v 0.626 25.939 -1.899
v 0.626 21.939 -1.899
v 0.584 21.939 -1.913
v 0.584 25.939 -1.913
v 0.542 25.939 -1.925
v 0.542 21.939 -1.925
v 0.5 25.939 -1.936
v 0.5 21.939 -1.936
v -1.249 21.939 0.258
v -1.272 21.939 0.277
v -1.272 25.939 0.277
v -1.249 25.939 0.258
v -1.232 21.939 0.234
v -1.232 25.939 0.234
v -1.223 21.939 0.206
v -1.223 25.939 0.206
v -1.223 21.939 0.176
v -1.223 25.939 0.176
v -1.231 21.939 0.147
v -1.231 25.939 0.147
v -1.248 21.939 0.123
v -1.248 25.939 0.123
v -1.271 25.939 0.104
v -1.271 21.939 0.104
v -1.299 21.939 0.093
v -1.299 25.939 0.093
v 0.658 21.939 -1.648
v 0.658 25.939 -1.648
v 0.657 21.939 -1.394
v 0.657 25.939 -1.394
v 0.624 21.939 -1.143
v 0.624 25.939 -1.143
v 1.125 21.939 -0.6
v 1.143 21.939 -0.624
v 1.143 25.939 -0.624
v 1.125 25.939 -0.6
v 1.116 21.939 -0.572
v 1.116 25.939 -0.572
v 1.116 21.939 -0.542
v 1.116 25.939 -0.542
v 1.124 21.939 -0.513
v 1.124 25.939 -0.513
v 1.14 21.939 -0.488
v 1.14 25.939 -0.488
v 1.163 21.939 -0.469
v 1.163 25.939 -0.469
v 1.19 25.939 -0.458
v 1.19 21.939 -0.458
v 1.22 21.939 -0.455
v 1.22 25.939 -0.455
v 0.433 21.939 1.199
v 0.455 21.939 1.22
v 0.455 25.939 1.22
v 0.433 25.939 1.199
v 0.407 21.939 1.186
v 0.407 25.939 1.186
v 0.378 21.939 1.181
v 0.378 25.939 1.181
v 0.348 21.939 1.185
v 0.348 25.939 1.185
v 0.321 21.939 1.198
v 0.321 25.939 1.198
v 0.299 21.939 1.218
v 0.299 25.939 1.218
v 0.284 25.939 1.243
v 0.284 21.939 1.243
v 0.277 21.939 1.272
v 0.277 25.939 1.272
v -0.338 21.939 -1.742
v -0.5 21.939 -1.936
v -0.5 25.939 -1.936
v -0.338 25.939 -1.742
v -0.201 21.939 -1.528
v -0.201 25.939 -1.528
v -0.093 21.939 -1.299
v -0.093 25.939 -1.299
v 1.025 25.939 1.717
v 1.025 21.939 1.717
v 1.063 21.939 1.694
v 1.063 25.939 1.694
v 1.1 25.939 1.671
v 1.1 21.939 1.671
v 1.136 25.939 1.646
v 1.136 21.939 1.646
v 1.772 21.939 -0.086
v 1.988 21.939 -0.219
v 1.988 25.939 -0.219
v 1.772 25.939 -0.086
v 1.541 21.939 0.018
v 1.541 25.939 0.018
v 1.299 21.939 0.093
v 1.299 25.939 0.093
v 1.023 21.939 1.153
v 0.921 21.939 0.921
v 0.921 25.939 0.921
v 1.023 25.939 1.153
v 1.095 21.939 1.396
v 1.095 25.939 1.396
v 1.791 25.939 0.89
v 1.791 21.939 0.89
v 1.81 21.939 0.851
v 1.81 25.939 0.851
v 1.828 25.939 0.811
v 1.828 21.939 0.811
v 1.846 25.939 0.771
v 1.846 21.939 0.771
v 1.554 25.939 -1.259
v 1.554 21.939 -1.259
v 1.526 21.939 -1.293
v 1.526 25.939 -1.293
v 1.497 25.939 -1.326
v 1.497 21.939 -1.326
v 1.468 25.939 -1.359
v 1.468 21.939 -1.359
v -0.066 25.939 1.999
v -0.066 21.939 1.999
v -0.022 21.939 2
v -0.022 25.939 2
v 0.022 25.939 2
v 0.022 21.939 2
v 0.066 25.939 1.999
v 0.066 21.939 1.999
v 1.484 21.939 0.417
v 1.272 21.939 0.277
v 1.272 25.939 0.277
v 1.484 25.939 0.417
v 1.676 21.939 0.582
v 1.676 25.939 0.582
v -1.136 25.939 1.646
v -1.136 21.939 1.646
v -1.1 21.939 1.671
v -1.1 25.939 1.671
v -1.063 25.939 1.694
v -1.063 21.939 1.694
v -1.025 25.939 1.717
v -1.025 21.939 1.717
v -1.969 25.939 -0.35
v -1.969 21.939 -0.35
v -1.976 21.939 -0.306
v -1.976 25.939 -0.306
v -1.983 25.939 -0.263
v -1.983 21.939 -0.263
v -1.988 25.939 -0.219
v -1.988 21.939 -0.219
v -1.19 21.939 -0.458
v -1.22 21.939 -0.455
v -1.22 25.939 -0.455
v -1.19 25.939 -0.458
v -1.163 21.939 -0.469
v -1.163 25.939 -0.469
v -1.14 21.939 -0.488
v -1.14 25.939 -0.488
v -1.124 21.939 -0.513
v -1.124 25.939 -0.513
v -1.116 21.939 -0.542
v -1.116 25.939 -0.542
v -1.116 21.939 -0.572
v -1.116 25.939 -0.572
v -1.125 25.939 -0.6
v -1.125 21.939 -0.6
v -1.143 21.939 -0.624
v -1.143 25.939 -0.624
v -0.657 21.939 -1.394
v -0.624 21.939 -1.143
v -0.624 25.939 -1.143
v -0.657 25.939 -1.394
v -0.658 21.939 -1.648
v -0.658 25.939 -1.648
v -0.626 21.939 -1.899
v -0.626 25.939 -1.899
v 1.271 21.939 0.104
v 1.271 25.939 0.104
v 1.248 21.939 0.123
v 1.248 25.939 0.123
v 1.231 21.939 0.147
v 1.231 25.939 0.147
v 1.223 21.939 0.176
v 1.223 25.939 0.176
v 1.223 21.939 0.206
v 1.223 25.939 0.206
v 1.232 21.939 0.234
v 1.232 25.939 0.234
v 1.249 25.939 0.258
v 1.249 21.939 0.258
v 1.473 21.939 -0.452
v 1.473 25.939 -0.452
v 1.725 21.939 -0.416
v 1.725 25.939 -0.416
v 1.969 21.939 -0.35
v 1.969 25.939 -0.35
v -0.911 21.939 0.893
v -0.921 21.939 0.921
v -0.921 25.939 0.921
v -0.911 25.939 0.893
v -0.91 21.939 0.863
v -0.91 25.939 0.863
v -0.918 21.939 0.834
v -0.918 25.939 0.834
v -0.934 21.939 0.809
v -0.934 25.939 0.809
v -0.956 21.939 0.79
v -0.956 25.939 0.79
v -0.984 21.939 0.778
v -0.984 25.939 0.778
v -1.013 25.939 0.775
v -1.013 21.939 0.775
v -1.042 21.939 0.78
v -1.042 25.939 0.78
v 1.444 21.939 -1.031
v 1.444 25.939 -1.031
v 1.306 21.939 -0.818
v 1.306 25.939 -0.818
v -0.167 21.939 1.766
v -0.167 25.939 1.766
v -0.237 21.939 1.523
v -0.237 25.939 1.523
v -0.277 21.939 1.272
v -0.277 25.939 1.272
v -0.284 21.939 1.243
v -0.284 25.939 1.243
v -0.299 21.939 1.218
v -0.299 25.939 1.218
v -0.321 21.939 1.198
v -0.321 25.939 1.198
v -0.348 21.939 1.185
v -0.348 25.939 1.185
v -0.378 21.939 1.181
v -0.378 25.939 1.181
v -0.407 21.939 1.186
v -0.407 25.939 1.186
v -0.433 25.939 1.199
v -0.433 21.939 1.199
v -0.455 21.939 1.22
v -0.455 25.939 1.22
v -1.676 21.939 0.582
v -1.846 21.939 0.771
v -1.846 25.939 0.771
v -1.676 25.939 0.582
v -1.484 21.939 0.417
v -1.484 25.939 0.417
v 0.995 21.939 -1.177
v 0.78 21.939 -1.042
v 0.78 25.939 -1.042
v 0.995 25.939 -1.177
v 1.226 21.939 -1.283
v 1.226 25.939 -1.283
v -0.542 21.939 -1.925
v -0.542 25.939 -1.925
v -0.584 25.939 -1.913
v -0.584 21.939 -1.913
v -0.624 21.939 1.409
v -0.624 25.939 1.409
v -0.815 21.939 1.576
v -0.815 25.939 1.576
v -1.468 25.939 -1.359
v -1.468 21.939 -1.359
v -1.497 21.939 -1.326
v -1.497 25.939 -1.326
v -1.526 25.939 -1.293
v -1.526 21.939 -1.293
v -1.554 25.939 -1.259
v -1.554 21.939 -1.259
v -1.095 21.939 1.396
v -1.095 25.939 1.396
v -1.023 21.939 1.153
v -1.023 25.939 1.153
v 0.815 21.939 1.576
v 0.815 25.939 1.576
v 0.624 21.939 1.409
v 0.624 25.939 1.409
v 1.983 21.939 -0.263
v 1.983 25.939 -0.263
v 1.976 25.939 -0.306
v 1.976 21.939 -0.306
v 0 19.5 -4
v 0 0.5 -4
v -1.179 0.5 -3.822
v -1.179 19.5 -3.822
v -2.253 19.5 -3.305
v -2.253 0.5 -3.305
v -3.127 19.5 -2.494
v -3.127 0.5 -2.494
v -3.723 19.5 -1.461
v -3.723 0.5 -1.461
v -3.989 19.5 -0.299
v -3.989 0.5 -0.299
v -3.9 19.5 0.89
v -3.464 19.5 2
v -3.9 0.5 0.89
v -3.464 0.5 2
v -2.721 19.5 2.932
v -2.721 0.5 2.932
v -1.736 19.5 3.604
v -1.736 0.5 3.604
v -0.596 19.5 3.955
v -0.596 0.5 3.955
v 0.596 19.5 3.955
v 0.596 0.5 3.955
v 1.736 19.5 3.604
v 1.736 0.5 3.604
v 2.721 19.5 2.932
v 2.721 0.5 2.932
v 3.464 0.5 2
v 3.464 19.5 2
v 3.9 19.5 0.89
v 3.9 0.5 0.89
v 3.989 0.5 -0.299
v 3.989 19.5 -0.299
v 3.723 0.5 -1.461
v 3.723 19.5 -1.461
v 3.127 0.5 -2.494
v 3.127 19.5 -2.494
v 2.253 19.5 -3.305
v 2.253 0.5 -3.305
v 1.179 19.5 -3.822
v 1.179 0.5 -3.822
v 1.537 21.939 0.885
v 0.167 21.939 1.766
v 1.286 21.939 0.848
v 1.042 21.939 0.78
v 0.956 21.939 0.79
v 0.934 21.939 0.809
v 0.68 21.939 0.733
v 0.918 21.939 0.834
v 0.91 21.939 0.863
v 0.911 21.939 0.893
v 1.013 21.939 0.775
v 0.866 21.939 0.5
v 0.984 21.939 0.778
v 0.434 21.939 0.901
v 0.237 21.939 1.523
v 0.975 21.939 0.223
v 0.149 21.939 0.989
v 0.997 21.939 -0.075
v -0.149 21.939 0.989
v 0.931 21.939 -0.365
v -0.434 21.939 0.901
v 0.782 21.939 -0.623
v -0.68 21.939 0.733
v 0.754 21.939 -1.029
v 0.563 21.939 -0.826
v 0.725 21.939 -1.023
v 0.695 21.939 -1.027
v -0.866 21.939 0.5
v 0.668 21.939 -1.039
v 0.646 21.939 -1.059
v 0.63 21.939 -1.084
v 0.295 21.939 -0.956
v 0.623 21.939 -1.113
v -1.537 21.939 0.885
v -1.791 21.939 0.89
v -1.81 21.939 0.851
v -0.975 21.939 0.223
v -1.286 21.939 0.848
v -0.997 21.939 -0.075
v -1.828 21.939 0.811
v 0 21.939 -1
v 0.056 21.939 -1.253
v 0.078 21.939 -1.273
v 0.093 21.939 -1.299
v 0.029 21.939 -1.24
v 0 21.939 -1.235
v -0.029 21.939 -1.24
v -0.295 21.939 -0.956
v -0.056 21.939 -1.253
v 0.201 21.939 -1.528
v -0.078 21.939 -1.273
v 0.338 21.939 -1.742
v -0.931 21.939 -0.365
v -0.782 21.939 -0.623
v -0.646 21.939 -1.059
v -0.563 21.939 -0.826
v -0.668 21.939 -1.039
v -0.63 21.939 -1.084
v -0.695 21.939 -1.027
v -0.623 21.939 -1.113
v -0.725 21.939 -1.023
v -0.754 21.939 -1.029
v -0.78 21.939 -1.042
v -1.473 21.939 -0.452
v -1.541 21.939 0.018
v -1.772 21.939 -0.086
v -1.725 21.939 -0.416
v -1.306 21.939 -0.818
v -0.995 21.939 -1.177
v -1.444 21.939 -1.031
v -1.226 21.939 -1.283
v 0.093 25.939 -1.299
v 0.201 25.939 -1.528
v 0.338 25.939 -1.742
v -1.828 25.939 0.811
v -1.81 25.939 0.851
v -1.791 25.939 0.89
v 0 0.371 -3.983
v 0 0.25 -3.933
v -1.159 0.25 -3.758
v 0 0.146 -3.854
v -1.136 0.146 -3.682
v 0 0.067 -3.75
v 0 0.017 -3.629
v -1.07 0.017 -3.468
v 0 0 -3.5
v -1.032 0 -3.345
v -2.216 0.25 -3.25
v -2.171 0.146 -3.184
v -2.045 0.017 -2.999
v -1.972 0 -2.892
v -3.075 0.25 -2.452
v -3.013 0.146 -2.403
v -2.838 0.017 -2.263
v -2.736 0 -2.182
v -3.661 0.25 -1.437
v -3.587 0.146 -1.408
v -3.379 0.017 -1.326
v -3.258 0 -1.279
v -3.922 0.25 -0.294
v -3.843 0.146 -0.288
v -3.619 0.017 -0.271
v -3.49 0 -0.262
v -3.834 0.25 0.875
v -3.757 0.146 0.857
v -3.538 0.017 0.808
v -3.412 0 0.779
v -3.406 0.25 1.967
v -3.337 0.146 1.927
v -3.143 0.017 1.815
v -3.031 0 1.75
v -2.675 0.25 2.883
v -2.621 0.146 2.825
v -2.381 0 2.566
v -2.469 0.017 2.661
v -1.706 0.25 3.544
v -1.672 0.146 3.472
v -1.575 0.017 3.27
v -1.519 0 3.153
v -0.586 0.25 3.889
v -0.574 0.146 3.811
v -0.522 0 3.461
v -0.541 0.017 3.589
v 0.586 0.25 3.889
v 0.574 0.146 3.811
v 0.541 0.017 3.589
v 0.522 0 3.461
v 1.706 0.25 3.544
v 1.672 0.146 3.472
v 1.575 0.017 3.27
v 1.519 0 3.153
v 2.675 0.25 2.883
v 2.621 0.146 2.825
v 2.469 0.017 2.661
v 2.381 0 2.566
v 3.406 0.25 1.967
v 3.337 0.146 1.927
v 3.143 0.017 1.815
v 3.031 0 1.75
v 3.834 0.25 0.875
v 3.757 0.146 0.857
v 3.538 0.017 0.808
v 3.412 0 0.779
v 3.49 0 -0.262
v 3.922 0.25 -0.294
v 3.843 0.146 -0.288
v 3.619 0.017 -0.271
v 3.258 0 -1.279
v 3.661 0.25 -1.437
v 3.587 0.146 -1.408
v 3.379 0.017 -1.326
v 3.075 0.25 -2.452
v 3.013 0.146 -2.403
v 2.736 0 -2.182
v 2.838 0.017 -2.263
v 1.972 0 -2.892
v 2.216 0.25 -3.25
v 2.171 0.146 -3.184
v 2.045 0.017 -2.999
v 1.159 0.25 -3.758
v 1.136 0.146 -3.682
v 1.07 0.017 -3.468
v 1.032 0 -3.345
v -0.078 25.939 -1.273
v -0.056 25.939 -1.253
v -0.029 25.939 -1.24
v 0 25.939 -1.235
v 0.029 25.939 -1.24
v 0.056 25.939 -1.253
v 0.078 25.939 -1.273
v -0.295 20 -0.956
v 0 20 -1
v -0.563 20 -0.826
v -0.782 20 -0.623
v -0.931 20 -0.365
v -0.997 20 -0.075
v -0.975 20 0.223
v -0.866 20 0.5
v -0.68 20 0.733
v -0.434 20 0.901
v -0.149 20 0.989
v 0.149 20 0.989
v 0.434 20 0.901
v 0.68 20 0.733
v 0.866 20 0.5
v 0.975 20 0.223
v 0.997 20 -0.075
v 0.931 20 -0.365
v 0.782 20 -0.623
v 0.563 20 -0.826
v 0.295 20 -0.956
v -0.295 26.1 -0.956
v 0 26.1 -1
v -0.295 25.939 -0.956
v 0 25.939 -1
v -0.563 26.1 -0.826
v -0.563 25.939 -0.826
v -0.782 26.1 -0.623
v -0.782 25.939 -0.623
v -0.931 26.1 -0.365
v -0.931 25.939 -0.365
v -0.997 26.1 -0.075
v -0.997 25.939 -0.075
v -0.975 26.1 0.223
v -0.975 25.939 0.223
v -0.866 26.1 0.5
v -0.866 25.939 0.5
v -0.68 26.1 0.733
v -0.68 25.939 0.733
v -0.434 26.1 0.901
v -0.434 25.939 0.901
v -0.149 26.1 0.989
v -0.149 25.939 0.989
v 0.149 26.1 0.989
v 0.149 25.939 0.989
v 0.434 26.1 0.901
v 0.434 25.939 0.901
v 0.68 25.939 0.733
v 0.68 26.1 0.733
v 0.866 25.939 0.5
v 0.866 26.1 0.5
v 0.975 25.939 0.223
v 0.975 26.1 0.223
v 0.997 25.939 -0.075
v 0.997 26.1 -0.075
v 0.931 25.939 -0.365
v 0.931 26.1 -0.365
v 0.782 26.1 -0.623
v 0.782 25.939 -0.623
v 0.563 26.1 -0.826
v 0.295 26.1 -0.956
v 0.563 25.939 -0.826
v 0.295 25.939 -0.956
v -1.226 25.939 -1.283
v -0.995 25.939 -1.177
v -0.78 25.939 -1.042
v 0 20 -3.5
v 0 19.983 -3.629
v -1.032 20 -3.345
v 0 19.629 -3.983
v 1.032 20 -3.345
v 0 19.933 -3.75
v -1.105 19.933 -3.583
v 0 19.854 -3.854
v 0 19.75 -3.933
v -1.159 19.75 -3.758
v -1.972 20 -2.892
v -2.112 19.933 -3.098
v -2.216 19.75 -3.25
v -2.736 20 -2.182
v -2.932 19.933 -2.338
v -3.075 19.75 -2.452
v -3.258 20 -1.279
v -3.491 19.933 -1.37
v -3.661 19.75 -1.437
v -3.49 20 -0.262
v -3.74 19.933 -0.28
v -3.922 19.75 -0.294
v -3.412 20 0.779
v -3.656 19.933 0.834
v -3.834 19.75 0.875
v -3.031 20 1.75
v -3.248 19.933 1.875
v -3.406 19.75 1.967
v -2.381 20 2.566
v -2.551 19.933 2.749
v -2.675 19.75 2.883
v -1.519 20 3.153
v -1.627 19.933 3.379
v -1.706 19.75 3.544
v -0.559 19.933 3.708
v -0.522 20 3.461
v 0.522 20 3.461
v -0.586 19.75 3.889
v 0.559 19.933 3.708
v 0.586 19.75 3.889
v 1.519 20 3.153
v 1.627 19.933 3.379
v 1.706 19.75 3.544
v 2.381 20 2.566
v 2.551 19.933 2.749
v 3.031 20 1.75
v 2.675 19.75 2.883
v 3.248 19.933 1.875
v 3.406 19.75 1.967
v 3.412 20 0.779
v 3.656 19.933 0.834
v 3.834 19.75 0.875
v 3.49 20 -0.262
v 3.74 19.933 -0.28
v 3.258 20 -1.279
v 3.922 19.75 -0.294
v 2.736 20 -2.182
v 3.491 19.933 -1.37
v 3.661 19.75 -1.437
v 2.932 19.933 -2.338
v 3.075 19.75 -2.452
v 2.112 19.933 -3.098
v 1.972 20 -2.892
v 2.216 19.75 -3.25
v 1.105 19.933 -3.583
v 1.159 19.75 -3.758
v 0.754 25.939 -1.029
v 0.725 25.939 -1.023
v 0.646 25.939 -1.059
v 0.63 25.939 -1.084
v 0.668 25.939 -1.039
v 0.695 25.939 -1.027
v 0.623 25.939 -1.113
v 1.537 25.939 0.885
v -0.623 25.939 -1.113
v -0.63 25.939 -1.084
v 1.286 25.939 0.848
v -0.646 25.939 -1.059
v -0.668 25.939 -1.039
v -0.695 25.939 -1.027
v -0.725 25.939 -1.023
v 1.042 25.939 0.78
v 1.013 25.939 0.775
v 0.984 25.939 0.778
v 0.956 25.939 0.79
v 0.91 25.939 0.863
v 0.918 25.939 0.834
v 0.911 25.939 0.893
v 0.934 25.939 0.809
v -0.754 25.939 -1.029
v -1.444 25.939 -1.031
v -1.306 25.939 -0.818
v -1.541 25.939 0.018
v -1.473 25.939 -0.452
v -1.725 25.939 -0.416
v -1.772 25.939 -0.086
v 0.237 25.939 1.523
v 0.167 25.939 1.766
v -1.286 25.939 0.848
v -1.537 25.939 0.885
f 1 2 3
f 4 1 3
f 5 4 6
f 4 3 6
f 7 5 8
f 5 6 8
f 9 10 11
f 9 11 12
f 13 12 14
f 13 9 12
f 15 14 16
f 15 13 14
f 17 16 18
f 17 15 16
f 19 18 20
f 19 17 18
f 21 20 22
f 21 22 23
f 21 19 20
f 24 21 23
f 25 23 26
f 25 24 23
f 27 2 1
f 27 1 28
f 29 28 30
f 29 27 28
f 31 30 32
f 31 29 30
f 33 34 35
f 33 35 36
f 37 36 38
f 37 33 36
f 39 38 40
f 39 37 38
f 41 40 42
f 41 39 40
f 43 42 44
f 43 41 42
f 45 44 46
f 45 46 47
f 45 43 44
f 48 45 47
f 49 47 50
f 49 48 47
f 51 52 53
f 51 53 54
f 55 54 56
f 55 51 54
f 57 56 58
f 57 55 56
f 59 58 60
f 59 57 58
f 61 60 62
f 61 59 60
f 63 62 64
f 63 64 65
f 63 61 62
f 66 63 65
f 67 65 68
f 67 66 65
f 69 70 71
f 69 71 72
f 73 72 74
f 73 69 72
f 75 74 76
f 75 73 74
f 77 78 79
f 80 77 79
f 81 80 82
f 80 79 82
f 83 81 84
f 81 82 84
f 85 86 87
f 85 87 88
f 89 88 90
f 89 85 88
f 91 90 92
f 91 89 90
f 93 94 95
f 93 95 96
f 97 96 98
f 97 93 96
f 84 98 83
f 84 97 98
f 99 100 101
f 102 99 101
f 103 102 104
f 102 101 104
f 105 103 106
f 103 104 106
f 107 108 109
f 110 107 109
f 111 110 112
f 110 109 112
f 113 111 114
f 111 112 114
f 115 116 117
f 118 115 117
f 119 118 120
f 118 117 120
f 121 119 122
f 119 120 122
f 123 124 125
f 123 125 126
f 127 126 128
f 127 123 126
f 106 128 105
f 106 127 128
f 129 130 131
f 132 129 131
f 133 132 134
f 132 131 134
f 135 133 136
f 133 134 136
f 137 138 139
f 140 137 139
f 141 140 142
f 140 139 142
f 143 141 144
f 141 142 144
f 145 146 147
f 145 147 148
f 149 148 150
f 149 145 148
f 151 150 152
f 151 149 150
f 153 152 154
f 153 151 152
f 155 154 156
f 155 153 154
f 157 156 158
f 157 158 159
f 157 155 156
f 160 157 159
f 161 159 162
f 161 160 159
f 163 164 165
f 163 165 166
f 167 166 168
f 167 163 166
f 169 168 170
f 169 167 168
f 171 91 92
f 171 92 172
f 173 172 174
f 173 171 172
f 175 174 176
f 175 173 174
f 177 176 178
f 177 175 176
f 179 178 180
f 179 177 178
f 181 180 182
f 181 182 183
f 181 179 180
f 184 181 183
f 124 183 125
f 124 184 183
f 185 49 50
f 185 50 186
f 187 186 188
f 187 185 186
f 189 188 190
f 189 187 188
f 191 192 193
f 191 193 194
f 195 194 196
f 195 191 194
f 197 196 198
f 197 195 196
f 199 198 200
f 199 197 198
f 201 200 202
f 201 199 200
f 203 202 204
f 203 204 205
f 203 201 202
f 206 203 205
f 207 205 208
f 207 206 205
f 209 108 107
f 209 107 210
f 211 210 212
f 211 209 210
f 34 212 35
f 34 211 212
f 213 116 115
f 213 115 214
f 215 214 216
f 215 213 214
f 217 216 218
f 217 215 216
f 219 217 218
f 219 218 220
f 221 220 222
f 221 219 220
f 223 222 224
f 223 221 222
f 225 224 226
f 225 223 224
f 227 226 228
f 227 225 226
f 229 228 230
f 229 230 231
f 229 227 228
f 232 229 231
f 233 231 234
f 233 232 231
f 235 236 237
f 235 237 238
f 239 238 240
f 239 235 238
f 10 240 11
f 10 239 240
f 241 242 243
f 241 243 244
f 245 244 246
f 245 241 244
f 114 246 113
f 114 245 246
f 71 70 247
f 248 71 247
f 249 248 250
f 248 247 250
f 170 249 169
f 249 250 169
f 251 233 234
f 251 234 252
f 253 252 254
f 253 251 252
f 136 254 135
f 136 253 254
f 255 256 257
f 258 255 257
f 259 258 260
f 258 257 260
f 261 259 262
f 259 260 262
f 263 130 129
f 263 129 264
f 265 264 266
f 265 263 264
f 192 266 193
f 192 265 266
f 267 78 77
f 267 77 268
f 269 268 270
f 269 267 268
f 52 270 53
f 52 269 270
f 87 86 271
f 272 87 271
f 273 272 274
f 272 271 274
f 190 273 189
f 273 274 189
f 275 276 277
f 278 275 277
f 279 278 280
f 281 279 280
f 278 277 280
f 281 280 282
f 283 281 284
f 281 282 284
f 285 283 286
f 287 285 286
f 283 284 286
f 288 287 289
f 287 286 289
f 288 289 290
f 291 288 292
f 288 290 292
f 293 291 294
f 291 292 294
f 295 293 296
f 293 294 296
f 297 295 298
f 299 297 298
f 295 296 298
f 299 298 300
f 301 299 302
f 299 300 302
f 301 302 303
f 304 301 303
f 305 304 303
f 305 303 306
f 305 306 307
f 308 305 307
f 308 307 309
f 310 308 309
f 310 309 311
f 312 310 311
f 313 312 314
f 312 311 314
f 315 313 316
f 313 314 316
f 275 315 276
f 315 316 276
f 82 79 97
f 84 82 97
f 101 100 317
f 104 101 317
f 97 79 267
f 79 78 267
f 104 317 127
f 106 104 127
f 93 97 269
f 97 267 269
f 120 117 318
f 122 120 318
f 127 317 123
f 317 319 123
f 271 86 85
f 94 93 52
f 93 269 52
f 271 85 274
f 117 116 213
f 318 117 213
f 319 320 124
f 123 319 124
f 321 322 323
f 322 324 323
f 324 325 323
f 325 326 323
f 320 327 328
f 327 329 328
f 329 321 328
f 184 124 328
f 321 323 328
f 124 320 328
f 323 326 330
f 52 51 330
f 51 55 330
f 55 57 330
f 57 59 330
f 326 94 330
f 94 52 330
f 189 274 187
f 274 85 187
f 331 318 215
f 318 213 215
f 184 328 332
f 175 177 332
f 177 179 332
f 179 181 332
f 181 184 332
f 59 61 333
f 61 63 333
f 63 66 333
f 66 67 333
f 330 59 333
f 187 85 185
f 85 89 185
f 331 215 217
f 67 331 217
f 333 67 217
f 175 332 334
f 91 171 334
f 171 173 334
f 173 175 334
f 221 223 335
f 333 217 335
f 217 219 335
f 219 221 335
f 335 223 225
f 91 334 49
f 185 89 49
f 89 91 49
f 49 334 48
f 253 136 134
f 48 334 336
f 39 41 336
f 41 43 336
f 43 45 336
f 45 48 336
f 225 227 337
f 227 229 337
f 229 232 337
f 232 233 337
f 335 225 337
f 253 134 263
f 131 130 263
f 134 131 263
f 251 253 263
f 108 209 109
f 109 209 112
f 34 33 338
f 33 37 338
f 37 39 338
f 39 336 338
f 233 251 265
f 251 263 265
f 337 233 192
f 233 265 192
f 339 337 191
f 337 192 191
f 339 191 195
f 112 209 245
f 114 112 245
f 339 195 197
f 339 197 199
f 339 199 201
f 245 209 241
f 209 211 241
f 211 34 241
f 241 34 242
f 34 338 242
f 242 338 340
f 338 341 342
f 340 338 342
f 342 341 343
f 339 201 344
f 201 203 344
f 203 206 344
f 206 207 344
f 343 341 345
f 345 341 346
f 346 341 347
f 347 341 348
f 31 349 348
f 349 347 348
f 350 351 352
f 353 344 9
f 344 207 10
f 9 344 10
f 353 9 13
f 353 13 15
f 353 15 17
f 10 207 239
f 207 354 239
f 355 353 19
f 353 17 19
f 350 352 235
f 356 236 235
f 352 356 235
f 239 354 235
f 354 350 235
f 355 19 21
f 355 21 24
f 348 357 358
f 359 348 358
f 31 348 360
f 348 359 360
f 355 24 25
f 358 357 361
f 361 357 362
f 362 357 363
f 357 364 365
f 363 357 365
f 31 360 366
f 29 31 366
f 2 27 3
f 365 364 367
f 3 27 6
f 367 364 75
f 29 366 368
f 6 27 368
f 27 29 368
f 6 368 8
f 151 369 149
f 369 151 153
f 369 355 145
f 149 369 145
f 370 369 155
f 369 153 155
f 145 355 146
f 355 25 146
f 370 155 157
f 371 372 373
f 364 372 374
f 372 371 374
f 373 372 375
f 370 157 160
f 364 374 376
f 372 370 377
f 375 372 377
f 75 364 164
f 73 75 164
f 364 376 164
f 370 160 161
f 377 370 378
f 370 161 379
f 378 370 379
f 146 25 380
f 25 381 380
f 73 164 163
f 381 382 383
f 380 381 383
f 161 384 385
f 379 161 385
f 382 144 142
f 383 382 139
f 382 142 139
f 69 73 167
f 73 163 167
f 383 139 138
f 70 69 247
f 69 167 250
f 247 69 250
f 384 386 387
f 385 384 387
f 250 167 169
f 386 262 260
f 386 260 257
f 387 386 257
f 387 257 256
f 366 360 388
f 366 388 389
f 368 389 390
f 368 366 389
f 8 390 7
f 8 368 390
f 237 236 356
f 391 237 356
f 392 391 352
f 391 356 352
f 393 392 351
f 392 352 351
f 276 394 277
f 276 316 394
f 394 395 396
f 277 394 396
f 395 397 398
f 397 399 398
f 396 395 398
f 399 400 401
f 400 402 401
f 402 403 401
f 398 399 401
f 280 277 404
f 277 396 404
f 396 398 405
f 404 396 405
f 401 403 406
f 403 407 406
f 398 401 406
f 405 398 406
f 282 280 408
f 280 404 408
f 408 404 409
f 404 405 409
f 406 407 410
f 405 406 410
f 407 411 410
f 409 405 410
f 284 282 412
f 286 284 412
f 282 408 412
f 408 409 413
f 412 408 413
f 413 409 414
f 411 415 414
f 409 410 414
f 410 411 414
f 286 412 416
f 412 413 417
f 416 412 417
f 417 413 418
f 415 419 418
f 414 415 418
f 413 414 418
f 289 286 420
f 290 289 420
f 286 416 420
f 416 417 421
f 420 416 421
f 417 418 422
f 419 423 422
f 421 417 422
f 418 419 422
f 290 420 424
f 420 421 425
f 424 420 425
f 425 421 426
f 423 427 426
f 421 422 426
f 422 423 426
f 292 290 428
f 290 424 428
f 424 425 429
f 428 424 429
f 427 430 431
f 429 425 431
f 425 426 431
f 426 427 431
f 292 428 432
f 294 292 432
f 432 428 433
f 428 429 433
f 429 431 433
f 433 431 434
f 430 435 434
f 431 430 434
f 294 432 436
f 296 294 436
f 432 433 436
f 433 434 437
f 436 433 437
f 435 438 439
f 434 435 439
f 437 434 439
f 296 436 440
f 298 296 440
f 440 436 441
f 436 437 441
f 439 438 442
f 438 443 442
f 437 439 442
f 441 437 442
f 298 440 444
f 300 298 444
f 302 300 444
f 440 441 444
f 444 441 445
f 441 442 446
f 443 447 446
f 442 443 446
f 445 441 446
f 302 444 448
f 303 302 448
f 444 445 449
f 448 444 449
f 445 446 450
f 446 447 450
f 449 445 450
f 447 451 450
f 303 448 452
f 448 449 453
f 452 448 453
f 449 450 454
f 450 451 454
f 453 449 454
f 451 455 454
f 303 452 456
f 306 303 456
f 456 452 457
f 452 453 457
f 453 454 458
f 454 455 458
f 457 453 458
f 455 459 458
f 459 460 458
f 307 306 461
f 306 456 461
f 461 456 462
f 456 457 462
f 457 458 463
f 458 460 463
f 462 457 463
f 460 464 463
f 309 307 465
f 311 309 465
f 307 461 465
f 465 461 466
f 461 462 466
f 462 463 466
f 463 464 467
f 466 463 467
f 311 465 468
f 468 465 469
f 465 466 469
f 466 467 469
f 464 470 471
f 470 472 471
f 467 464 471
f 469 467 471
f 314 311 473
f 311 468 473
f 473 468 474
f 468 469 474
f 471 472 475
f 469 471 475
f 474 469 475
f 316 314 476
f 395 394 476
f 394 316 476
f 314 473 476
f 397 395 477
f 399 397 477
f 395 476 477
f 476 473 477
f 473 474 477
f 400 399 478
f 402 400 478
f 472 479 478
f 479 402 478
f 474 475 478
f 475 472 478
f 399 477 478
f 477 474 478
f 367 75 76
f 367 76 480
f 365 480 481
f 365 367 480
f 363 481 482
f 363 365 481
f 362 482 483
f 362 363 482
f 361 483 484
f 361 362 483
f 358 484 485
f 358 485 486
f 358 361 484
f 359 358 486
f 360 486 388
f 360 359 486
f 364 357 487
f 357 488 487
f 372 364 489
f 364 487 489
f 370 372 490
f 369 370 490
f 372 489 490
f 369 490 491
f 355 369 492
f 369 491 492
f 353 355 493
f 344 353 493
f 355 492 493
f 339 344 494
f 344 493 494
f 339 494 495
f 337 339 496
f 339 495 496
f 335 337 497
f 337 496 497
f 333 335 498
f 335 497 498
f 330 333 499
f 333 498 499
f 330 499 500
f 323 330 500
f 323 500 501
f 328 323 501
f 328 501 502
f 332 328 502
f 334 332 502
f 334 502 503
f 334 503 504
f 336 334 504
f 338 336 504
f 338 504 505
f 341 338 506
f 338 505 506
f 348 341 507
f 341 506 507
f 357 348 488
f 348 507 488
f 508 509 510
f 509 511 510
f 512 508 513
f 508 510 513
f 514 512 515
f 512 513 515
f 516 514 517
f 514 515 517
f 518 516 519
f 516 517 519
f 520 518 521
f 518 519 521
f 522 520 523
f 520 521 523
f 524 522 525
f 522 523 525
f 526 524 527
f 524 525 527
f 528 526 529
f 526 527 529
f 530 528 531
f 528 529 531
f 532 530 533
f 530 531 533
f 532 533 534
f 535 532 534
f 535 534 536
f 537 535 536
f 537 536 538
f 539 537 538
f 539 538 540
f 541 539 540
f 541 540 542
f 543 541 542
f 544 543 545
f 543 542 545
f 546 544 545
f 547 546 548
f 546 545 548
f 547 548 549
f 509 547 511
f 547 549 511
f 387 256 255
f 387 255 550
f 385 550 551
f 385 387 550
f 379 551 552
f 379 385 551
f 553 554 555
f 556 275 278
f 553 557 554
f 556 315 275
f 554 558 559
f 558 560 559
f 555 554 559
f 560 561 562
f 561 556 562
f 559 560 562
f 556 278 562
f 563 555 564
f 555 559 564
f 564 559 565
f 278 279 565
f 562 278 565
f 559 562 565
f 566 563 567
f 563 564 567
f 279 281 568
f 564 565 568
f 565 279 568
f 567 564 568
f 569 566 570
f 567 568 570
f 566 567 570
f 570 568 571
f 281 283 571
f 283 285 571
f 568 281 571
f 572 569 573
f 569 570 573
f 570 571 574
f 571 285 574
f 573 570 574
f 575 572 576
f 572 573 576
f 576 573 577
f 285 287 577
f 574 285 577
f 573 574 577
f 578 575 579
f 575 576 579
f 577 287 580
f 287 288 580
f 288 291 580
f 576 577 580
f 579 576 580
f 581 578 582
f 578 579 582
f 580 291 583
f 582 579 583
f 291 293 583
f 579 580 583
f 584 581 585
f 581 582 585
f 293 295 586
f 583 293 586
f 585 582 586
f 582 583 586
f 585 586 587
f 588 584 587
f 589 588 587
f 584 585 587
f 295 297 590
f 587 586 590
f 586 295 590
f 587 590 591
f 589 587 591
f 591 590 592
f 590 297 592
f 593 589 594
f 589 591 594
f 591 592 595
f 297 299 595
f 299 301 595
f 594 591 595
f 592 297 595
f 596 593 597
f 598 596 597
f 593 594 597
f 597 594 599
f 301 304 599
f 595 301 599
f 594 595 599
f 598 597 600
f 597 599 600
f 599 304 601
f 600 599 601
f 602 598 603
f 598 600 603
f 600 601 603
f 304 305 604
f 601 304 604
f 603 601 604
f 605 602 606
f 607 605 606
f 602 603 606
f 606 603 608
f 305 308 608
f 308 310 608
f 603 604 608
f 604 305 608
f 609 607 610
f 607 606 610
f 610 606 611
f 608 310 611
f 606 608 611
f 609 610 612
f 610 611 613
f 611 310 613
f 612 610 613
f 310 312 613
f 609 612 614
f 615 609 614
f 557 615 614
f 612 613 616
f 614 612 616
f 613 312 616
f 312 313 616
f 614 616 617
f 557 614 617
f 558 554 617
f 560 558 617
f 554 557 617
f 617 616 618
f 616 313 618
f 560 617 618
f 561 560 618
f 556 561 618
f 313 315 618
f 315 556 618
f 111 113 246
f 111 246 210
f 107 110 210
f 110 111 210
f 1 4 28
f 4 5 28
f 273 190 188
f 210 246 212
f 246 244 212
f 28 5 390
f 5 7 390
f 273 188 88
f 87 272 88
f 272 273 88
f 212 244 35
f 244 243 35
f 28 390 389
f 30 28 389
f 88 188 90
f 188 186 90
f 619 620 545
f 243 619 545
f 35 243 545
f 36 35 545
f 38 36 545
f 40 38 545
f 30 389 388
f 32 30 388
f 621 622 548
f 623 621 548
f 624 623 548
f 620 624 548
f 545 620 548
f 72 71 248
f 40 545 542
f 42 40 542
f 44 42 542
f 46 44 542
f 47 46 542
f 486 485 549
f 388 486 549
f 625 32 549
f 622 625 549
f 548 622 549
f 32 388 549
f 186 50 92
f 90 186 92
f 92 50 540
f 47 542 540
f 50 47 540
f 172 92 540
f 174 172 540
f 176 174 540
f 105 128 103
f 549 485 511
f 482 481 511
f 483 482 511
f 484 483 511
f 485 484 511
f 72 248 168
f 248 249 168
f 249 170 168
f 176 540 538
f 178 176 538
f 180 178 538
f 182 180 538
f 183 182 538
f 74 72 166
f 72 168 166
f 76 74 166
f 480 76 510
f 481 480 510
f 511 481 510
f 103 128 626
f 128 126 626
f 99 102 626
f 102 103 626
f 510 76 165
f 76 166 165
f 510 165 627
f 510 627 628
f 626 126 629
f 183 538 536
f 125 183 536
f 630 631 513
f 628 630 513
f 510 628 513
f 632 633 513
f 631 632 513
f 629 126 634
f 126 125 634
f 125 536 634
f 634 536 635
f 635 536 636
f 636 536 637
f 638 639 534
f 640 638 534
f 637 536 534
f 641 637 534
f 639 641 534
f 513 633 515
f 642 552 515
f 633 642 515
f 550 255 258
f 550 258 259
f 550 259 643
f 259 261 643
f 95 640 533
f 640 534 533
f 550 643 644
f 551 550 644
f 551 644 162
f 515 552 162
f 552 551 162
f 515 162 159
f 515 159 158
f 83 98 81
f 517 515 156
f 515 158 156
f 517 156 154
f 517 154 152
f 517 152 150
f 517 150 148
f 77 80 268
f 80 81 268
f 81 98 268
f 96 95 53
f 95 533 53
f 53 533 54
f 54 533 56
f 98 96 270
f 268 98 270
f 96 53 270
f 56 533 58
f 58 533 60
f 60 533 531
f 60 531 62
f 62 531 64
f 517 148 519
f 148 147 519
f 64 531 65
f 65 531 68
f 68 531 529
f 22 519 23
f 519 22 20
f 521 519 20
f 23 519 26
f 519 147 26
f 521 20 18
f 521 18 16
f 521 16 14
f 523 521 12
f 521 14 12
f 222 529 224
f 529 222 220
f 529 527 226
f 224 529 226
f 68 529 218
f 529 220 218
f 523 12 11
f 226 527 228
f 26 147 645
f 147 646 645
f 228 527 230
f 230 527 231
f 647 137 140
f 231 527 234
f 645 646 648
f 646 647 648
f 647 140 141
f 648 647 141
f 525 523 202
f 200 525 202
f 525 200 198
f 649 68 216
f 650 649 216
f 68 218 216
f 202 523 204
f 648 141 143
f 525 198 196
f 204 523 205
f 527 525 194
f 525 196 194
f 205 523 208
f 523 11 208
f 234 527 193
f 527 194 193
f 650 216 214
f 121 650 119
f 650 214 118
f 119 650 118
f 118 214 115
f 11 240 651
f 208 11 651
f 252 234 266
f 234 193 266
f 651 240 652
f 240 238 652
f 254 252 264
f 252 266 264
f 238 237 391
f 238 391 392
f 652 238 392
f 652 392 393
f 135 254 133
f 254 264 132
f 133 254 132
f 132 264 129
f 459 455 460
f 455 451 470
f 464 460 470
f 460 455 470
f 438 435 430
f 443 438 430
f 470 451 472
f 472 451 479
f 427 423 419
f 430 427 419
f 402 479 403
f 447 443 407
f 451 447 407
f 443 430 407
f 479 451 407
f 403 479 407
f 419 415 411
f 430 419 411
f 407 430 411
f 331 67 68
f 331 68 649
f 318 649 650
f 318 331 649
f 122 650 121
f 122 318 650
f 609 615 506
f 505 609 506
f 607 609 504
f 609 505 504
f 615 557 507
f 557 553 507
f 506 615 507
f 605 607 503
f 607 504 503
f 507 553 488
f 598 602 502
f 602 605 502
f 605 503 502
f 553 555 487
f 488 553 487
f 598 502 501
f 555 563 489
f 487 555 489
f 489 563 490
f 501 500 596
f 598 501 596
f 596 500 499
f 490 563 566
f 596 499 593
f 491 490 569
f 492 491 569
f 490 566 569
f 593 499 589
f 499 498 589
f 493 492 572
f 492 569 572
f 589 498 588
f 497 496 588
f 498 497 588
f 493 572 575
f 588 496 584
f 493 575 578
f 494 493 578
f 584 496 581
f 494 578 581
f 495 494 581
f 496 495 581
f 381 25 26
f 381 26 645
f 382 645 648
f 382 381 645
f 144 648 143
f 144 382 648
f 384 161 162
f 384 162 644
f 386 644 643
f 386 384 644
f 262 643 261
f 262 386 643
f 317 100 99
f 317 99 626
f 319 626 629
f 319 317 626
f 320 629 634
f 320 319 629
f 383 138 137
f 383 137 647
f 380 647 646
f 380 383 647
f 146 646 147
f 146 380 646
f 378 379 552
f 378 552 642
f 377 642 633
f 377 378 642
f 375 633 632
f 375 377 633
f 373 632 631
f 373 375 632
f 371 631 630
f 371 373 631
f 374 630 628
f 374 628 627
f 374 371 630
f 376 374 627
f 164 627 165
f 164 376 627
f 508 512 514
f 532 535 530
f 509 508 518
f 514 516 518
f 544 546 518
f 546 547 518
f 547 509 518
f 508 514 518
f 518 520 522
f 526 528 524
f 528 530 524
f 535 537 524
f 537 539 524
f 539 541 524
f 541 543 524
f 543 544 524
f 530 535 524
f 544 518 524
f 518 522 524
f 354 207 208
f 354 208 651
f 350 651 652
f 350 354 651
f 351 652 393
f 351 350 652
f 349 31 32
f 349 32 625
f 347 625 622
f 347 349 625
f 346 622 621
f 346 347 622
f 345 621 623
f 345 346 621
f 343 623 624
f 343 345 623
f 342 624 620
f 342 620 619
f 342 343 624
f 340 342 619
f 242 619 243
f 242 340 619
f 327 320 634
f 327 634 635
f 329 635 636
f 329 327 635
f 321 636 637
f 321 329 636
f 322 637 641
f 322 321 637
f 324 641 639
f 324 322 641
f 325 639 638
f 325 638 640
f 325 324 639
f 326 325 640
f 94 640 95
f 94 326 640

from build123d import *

# Parameters (mm, degrees)
RADYUS1_R               = 0.5
KES_EKSTR_ZYON1_START   = -4
KES_EKSTR_ZYON1_DEPTH   = 4
DAIRESEL_KAPLAMA1_COUNT = 11


with BuildPart() as part:
    # Çizim1 → Döndür1 (revolve)
    with BuildSketch(Plane.XY, mode=Mode.PRIVATE) as d_nd_r1_sk:
        Polygon((0, 0), (0, 26.1), (1, 26.1), (1, 25.939294597), (2, 25.939294597), (2, 21.939294597), (1, 21.939294597), (1, 20), (4, 20), (4, 0), align=None)
    revolve(d_nd_r1_sk.sketch.rotate(Axis((0, 0, 0), (0, 1, 0)), 90), axis=Axis((0, 0, 0), (0, 1, 0)))

    # Radyus1
    radyus1_edges = [part.edges().sort_by_distance(p)[0] for p in [
        (0, 0, 4),
        (0, 20, 4),
    ]]
    fillet(radyus1_edges, radius=RADYUS1_R)

    # Çizim2 → Kes-Ekstrüzyon1 (cut)
    with BuildSketch(Plane(origin=(0, 25.939294597, 0), x_dir=(1, 0, 0), z_dir=(0, 1, 0)).offset(KES_EKSTR_ZYON1_START)):
        with BuildLine():
            ThreePointArc((0.5, 1.936491673), (0, 2), (-0.5, 1.936491673))
            ThreePointArc((-0.5, 1.936491673), (-0.266031544, 1.636956648), (-0.092954447, 1.298568131))
            ThreePointArc((-0.092954447, 1.298568131), (0, 1.235439134), (0.092954447, 1.298568131))
            ThreePointArc((0.092954447, 1.298568131), (0.266031544, 1.636956648), (0.5, 1.936491673))
        make_face()
    kes_ekstr_zyon1 = extrude(amount=KES_EKSTR_ZYON1_DEPTH, mode=Mode.SUBTRACT)

    # Dairesel Kaplama1: Kes-Ekstrüzyon1 ×11 about axis
    dairesel_kaplama1_axis = Axis((0, 0, 0), (0, 1, 0))
    for i in range(1, DAIRESEL_KAPLAMA1_COUNT):
        add(kes_ekstr_zyon1.rotate(dairesel_kaplama1_axis, i * 360 / DAIRESEL_KAPLAMA1_COUNT), mode=Mode.SUBTRACT)


solid = part.part
